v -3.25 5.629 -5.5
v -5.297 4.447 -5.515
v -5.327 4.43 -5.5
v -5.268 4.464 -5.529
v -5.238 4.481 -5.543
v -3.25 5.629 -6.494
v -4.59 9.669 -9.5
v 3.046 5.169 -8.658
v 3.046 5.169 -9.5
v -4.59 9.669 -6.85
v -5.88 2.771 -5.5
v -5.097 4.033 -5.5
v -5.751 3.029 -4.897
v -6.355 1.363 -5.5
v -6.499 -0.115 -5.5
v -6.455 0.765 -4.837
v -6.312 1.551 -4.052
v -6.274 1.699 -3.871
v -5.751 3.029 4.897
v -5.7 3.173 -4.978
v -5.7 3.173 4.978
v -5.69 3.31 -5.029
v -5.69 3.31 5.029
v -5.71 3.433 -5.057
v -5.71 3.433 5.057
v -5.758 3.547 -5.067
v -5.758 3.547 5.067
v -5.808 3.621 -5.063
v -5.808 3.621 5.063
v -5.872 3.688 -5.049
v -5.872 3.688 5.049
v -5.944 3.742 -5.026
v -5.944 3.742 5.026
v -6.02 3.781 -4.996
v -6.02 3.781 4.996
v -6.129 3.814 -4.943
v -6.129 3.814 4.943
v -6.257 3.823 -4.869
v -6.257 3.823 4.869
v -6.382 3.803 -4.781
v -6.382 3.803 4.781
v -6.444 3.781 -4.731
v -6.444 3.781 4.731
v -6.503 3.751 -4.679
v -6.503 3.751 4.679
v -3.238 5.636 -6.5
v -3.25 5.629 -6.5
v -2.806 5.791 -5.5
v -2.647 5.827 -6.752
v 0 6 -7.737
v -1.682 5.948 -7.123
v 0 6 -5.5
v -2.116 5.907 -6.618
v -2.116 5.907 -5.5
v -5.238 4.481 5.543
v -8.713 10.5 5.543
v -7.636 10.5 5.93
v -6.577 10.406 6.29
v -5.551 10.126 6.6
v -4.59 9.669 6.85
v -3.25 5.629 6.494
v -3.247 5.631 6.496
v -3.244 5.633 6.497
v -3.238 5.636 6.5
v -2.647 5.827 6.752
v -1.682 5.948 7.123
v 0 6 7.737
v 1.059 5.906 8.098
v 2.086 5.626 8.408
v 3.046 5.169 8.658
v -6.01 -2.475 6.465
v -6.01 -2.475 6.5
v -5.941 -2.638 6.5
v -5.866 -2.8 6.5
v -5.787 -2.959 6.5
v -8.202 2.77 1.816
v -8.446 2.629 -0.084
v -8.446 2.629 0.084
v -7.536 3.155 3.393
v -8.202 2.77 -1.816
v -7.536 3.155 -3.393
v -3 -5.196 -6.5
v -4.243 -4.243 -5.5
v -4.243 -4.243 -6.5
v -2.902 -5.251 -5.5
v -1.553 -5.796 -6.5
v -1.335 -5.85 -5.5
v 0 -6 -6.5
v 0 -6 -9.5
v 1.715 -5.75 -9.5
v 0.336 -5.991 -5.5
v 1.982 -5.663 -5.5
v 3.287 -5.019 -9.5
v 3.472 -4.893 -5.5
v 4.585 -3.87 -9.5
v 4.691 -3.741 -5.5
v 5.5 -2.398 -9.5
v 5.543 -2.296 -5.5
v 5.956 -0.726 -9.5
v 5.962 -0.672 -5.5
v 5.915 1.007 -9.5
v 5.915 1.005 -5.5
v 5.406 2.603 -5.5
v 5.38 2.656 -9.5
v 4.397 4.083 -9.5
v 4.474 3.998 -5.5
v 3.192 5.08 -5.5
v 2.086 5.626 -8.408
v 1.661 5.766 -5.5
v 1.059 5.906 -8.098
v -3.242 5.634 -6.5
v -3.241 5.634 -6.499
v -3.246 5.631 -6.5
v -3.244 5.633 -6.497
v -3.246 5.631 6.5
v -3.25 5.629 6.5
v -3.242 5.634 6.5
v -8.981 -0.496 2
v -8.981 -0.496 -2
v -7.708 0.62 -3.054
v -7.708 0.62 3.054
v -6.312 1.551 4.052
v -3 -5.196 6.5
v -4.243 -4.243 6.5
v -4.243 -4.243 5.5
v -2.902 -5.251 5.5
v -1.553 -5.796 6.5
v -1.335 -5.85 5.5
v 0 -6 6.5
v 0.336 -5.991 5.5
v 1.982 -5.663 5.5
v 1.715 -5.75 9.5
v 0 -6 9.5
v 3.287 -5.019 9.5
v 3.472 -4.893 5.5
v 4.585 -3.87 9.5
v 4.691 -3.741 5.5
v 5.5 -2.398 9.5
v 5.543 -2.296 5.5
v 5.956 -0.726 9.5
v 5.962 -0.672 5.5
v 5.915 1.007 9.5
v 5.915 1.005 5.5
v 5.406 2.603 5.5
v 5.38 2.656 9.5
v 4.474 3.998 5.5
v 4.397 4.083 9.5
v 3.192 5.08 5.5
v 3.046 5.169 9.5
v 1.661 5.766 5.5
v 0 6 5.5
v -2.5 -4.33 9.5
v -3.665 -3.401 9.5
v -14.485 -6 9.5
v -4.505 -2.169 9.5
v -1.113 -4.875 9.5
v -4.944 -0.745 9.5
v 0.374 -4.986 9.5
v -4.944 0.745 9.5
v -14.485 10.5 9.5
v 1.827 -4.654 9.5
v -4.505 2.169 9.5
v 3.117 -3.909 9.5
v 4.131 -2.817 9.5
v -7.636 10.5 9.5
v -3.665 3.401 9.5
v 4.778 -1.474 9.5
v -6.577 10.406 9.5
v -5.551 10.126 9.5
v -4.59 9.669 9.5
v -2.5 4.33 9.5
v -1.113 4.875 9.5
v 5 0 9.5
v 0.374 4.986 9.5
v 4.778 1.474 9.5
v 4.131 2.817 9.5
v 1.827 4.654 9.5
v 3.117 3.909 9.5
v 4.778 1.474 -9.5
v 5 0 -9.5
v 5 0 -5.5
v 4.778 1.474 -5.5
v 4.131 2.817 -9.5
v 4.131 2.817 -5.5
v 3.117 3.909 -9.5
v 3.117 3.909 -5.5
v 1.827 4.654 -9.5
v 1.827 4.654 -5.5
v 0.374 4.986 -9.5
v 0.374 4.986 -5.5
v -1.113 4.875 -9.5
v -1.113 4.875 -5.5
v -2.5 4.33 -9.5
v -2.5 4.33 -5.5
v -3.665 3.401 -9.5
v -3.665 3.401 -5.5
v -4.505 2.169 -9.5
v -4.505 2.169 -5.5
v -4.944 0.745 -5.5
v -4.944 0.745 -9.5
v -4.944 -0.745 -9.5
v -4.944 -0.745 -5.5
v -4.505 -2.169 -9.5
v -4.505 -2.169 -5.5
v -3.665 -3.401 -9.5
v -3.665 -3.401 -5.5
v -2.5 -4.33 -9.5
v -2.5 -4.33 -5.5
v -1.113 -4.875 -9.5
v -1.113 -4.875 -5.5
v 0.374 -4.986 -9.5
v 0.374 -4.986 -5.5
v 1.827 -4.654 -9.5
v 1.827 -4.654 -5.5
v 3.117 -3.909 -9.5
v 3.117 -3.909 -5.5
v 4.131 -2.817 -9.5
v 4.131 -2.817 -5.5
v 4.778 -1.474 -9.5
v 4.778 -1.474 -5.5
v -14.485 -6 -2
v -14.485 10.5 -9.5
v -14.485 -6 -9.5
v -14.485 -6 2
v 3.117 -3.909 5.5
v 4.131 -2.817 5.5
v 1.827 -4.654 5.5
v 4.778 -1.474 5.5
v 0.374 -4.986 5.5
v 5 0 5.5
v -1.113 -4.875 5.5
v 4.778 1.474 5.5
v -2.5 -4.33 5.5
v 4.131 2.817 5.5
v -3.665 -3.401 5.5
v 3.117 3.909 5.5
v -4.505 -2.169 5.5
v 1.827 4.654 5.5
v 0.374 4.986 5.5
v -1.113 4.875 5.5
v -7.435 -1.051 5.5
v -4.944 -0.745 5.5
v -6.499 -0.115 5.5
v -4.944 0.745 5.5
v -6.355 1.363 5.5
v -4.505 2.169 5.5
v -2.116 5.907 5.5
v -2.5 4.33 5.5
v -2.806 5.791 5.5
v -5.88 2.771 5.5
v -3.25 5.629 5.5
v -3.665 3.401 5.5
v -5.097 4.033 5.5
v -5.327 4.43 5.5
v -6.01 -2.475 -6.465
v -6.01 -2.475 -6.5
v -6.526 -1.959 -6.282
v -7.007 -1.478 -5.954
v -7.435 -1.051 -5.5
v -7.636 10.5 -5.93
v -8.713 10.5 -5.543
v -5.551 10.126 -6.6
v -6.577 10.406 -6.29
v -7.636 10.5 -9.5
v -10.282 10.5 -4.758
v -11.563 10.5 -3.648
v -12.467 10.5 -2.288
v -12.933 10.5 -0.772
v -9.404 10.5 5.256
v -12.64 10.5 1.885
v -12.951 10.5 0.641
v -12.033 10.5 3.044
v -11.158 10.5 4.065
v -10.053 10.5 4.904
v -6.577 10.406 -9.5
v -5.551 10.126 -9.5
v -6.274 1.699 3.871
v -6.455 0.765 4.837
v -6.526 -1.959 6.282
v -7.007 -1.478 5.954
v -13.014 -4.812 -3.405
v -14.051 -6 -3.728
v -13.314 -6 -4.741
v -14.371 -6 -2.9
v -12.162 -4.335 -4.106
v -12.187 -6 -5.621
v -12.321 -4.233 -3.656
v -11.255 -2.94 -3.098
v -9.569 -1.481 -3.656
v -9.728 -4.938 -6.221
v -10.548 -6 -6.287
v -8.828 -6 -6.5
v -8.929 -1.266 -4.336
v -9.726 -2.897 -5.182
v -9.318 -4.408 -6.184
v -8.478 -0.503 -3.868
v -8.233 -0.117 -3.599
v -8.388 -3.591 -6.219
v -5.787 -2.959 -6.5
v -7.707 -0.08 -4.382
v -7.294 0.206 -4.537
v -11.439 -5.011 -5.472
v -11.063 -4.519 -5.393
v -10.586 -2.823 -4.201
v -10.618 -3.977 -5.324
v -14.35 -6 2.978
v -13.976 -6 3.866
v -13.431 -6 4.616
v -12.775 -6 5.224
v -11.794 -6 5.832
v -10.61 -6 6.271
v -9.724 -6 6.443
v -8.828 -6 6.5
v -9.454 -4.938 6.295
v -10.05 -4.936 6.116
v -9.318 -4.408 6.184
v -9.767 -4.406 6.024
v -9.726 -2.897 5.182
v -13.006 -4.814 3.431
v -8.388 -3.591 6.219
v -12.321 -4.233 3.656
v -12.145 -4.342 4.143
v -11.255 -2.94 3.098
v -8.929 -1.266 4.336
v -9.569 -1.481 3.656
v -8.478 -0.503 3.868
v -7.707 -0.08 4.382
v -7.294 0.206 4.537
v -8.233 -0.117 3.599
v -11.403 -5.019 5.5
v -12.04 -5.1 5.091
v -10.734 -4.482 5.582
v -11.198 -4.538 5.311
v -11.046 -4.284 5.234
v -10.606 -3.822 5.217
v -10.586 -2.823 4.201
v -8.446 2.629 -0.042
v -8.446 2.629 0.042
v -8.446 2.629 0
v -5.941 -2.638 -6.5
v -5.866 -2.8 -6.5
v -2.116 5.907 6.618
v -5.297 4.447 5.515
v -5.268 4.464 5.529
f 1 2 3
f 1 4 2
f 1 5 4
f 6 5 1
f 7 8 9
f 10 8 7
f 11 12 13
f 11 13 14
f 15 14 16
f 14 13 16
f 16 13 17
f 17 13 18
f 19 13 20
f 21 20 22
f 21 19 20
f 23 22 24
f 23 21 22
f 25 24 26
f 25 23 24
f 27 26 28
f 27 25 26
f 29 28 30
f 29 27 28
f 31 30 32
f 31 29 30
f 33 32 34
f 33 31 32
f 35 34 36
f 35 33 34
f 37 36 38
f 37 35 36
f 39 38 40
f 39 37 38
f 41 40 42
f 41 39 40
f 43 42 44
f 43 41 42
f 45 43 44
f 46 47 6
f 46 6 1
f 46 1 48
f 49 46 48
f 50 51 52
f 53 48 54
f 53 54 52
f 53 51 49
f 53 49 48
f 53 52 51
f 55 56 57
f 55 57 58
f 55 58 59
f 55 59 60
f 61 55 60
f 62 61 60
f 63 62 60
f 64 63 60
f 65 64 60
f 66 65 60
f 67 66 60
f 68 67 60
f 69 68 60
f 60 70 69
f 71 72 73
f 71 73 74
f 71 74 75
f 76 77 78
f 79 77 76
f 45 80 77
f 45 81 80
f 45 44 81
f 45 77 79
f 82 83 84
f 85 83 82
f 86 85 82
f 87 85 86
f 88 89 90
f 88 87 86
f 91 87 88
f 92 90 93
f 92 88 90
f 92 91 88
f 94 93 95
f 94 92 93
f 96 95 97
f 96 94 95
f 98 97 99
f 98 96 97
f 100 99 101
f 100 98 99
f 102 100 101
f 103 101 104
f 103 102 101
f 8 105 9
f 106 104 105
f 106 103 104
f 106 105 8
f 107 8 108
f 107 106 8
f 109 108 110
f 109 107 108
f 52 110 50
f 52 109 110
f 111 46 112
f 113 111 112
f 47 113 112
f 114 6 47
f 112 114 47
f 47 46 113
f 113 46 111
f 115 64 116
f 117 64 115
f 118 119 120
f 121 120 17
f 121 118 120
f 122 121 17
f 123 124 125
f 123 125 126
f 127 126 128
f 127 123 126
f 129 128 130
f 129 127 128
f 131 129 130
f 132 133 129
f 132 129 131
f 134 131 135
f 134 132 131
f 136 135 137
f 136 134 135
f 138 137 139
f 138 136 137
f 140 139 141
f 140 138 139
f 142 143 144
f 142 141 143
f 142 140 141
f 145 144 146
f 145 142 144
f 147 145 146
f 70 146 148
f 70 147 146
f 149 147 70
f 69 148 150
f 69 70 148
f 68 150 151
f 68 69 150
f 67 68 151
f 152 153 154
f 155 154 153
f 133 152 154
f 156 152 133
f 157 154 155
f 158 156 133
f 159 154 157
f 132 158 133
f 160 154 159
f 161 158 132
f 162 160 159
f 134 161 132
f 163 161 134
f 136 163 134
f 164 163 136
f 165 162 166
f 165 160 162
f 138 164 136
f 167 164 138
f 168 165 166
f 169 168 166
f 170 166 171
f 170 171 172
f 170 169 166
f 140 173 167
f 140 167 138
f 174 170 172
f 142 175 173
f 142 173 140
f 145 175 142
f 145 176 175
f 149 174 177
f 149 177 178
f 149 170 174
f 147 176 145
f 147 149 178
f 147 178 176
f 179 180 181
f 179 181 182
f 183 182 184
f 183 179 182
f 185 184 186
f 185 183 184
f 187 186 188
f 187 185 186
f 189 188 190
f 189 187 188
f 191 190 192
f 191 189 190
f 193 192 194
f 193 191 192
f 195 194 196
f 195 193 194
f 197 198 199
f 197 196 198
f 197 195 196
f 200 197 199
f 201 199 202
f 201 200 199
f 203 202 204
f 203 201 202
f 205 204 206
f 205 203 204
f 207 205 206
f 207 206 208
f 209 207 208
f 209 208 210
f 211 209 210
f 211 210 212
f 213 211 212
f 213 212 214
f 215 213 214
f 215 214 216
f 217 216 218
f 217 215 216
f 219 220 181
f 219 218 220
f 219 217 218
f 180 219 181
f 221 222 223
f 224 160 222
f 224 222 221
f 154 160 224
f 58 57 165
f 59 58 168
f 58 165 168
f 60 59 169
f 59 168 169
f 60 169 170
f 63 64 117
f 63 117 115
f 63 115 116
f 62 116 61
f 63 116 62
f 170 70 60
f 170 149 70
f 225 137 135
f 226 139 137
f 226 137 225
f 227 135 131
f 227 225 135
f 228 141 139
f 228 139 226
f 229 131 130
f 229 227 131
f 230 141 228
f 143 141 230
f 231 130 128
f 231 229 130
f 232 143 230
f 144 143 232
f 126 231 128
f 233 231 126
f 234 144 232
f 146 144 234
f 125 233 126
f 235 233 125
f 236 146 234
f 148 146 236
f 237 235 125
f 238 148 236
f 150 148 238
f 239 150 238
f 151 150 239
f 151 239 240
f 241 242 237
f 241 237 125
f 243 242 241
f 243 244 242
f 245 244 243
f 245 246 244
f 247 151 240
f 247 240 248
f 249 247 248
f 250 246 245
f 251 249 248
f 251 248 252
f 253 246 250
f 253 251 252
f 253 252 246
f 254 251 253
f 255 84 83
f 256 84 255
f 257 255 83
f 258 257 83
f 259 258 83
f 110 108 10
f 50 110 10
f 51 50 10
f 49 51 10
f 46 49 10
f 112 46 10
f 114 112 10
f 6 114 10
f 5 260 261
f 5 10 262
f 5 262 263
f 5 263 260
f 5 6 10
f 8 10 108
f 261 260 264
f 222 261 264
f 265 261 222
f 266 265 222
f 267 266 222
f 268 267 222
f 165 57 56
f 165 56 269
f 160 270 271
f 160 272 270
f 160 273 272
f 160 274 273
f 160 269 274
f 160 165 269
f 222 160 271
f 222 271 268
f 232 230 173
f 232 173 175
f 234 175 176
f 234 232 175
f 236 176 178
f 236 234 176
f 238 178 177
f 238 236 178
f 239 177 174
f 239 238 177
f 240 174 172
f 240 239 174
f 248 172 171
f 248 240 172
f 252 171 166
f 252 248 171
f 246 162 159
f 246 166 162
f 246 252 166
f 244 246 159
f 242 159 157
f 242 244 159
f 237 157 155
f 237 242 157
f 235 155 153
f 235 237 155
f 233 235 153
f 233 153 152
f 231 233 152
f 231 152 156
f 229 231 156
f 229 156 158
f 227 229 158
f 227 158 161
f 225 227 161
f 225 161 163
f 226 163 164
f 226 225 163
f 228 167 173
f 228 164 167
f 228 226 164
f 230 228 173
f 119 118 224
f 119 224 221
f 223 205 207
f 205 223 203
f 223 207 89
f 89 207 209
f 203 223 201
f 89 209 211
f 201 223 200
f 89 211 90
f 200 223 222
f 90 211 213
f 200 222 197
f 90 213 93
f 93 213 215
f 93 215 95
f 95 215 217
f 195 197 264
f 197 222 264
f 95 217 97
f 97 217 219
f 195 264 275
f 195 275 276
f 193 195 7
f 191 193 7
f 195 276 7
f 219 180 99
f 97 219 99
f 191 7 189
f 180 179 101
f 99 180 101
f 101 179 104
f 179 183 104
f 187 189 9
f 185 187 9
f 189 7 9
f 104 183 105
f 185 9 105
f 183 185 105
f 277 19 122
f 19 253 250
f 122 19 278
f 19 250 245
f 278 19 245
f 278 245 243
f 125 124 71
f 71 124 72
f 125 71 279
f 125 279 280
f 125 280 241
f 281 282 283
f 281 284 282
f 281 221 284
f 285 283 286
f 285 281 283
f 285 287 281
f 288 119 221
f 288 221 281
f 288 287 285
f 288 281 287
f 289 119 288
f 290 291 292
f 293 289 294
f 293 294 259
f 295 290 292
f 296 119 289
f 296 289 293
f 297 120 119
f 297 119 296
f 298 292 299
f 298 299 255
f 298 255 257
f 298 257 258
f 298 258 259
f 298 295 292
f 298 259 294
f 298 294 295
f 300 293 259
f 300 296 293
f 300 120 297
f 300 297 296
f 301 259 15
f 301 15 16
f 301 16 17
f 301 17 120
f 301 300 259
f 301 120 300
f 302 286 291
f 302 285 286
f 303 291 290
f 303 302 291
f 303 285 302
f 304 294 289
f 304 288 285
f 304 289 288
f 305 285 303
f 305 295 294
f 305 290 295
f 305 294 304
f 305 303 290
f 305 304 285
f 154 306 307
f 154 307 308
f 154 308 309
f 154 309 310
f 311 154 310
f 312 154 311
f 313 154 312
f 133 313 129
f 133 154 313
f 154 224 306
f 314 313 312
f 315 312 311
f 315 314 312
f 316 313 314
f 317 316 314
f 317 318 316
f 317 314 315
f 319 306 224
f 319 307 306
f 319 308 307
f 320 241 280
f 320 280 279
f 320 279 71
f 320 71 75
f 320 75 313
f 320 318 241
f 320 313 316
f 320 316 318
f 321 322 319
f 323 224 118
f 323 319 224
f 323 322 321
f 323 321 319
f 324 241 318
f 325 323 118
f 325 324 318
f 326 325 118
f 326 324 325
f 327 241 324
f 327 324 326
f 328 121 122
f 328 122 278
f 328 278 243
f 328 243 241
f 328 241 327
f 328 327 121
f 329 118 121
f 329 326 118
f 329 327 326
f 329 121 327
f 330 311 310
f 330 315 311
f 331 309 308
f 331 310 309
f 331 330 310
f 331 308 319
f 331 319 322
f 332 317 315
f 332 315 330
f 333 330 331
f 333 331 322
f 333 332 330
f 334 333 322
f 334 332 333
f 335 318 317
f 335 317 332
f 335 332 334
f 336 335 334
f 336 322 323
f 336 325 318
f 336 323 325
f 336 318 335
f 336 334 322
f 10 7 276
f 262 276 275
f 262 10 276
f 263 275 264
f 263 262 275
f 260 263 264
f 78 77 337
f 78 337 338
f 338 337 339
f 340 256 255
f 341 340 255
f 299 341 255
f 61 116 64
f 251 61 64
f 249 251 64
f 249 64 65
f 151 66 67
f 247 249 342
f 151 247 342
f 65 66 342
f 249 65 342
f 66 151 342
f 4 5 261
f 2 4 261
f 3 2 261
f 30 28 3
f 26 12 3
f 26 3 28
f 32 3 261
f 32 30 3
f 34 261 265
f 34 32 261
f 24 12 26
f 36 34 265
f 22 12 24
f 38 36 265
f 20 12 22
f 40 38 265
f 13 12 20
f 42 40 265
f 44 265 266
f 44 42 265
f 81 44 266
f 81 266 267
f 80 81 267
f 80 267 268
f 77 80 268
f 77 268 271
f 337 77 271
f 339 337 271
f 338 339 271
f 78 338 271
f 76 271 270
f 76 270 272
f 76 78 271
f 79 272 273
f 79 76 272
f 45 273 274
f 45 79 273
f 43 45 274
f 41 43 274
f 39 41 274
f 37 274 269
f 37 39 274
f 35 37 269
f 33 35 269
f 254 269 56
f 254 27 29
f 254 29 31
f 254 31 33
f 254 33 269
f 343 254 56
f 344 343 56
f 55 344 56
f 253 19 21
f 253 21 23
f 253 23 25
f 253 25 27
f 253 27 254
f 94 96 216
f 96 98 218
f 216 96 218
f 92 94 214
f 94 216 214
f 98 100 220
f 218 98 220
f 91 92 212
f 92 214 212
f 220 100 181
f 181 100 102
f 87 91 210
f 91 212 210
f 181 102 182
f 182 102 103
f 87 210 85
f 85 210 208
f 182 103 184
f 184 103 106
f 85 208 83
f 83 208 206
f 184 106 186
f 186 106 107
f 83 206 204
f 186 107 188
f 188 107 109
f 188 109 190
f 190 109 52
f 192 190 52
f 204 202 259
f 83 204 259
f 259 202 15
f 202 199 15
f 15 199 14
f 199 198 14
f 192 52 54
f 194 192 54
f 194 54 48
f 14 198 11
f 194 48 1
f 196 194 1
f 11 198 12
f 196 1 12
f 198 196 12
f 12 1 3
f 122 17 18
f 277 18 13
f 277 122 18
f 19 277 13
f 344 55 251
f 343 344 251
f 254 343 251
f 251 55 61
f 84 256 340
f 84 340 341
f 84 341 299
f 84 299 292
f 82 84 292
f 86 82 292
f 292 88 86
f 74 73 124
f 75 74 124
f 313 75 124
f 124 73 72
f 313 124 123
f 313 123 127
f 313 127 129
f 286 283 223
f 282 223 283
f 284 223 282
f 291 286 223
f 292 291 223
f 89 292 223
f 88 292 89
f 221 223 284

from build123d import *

# Parameters (mm, degrees)
EXTRUDE_1_DEPTH          = 9.5
CUT_EXTRUDE_1_DEPTH      = 19.754173631
CUT_EXTRUDE_1_DEPTH_BACK = 19.754173631
CUT_EXTRUDE_3_DEPTH      = 18.322626143
CUT_EXTRUDE_3_DEPTH_BACK = 18.322626143
SKETCH_5_R               = 6.5
CUT_EXTRUDE_4_DEPTH      = 6.5
EXTRUDE_2_DEPTH          = 6.5
EXTRUDE_START            = -3
EXTRUDE_3_DEPTH          = 4
CUT_EXTRUDE_5_DEPTH      = 21.256440541
CUT_EXTRUDE_5_DEPTH_BACK = 21.256440541
SKETCH_10_R              = 5
FILLET_1_R               = 6


with BuildPart() as part:
    # Эскиз2 → Бобышка-Вытянуть1 (new, symmetric)
    with BuildSketch(Plane.XY):
        with BuildLine():
            Line((3.046153846, 5.169230769), (-6, 10.5))
            Line((-6, 10.5), (-14.485281374, 10.5))
            Line((-14.485281374, 10.5), (-14.485281374, -6))
            Line((-14.485281374, -6), (0, -6))
            ThreePointArc((0, -6), (5.788582927, -1.578704435), (3.046153846, 5.169230769))
        make_face()
    extrude(amount=EXTRUDE_1_DEPTH, both=True)

    # Эскиз3 → Вырез-Вытянуть1 (cut, two sides: drawn at the far end of the back side and taken through both)
    with BuildSketch(Plane(origin=(-3.249999973, 5.629165078, 0), x_dir=(0.8660254037844386, 0.4999999999999999, 0), z_dir=(-0.49999999999999994, 0.8660254037844387, 0)).offset(-CUT_EXTRUDE_1_DEPTH_BACK)):
        with BuildLine():
            Line((6, -8.979634576), (6, 8.979634576))
            Line((6, 8.979634576), (-2.296100594, 5.543277195))
            ThreePointArc((-2.296100594, 5.543277195), (-6, 0), (-2.296100594, -5.543277195))
            Line((-2.296100594, -5.543277195), (6, -8.979634576))
        make_face()
    extrude(amount=CUT_EXTRUDE_1_DEPTH + CUT_EXTRUDE_1_DEPTH_BACK, mode=Mode.SUBTRACT)

    # Эскиз4 → Вырез-Вытянуть3 (cut, two sides: drawn at the far end of the back side and taken through both)
    with BuildSketch(Plane(origin=(-4.242640687, 4.242640687, 0), x_dir=(-0.7071067811865511, 0.707106781186544, 0), z_dir=(-0.707106781186544, -0.7071067811865511, 0)).offset(-CUT_EXTRUDE_3_DEPTH_BACK)):
        with BuildLine():
            Line((-12, -6.5), (-4, -6.5))
            add(Edge.make_bspline(
                [(-4, -6.5), (0, -6.5), (0, -2)],
                knots=[0, 0, 0, 1.570796327, 1.570796327, 1.570796327], degree=2, weights=[1, 0.707106781, 1]))
            Line((0, -2), (0, 2))
            add(Edge.make_bspline(
                [(0, 2), (0, 6.5), (-4, 6.5)],
                knots=[4.71238898, 4.71238898, 4.71238898, 6.283185307, 6.283185307, 6.283185307], degree=2, weights=[1, 0.707106781, 1]))
            Line((-4, 6.5), (-12, 6.5))
            Line((-12, 6.5), (-12, -6.5))
        make_face()
    extrude(amount=CUT_EXTRUDE_3_DEPTH + CUT_EXTRUDE_3_DEPTH_BACK, mode=Mode.SUBTRACT)

    # Эскиз5 → Вырез-Вытянуть4 (cut, symmetric)
    with BuildSketch(Plane.XY):
        Circle(SKETCH_5_R)
    extrude(amount=CUT_EXTRUDE_4_DEPTH, both=True, mode=Mode.SUBTRACT)

    # Эскиз6 → Бобышка-Вытянуть2 (add, symmetric)
    with BuildSketch(Plane.XY):
        with BuildLine():
            Line((-6.502520338, 3.75132157), (-8.445640507, 2.629460617))
            Line((-8.445640507, 2.629460617), (-8.980852778, -0.495571404))
            ThreePointArc((-8.980852778, -0.495571404), (-7.713770339, 0.615313333), (-6.312263919, 1.550910769))
            ThreePointArc((-6.312263919, 1.550910769), (-6.076847823, 2.306928809), (-5.751252167, 3.028712353))
            ThreePointArc((-5.751252167, 3.028712353), (-5.855186593, 3.672492332), (-6.502520338, 3.75132157))
        make_face()
    extrude(amount=EXTRUDE_2_DEPTH, both=True)

    # Эскиз9 → Бобышка-Вытянуть3 (add)
    with BuildSketch(Plane(origin=(0, 0, 6.5), x_dir=(-1, 0, 0), z_dir=(0, 0, -1)).offset(EXTRUDE_START)):
        with BuildLine():
            Line((4.242640687, -4.242640687), (10.137783082, 1.652501708))
            Line((10.137783082, 1.652501708), (3.25, 5.629165125))
            add(Edge.make_bspline(
                [(3.25, 5.629165125), (2.607695155, 6), (0, 6)],
                knots=[0, 0, 0, 1, 1, 1], degree=2))
            ThreePointArc((0, 6), (-5.543277195, -2.296100594), (4.242640687, -4.242640687))
        make_face()
    extrude_3 = extrude(amount=EXTRUDE_3_DEPTH)

    # Зеркальное отражение1: Бобышка-Вытянуть3 across plane
    add(extrude_3.mirror(Plane.XY))

    # Эскиз10 → Вырез-Вытянуть5 (cut, two sides: drawn at the far end of the back side and taken through both)
    with BuildSketch(Plane.XY.offset(-CUT_EXTRUDE_5_DEPTH_BACK)):
        Circle(SKETCH_10_R)
    extrude(amount=CUT_EXTRUDE_5_DEPTH + CUT_EXTRUDE_5_DEPTH_BACK, mode=Mode.SUBTRACT)

    # Скругление1
    fillet_1_edges = [part.edges().sort_by_distance(p)[0] for p in [
        (-6, 10.5, 8.008328799),
        (-6, 10.5, -8.008328799),
    ]]
    fillet(fillet_1_edges, radius=FILLET_1_R)


solid = part.part
